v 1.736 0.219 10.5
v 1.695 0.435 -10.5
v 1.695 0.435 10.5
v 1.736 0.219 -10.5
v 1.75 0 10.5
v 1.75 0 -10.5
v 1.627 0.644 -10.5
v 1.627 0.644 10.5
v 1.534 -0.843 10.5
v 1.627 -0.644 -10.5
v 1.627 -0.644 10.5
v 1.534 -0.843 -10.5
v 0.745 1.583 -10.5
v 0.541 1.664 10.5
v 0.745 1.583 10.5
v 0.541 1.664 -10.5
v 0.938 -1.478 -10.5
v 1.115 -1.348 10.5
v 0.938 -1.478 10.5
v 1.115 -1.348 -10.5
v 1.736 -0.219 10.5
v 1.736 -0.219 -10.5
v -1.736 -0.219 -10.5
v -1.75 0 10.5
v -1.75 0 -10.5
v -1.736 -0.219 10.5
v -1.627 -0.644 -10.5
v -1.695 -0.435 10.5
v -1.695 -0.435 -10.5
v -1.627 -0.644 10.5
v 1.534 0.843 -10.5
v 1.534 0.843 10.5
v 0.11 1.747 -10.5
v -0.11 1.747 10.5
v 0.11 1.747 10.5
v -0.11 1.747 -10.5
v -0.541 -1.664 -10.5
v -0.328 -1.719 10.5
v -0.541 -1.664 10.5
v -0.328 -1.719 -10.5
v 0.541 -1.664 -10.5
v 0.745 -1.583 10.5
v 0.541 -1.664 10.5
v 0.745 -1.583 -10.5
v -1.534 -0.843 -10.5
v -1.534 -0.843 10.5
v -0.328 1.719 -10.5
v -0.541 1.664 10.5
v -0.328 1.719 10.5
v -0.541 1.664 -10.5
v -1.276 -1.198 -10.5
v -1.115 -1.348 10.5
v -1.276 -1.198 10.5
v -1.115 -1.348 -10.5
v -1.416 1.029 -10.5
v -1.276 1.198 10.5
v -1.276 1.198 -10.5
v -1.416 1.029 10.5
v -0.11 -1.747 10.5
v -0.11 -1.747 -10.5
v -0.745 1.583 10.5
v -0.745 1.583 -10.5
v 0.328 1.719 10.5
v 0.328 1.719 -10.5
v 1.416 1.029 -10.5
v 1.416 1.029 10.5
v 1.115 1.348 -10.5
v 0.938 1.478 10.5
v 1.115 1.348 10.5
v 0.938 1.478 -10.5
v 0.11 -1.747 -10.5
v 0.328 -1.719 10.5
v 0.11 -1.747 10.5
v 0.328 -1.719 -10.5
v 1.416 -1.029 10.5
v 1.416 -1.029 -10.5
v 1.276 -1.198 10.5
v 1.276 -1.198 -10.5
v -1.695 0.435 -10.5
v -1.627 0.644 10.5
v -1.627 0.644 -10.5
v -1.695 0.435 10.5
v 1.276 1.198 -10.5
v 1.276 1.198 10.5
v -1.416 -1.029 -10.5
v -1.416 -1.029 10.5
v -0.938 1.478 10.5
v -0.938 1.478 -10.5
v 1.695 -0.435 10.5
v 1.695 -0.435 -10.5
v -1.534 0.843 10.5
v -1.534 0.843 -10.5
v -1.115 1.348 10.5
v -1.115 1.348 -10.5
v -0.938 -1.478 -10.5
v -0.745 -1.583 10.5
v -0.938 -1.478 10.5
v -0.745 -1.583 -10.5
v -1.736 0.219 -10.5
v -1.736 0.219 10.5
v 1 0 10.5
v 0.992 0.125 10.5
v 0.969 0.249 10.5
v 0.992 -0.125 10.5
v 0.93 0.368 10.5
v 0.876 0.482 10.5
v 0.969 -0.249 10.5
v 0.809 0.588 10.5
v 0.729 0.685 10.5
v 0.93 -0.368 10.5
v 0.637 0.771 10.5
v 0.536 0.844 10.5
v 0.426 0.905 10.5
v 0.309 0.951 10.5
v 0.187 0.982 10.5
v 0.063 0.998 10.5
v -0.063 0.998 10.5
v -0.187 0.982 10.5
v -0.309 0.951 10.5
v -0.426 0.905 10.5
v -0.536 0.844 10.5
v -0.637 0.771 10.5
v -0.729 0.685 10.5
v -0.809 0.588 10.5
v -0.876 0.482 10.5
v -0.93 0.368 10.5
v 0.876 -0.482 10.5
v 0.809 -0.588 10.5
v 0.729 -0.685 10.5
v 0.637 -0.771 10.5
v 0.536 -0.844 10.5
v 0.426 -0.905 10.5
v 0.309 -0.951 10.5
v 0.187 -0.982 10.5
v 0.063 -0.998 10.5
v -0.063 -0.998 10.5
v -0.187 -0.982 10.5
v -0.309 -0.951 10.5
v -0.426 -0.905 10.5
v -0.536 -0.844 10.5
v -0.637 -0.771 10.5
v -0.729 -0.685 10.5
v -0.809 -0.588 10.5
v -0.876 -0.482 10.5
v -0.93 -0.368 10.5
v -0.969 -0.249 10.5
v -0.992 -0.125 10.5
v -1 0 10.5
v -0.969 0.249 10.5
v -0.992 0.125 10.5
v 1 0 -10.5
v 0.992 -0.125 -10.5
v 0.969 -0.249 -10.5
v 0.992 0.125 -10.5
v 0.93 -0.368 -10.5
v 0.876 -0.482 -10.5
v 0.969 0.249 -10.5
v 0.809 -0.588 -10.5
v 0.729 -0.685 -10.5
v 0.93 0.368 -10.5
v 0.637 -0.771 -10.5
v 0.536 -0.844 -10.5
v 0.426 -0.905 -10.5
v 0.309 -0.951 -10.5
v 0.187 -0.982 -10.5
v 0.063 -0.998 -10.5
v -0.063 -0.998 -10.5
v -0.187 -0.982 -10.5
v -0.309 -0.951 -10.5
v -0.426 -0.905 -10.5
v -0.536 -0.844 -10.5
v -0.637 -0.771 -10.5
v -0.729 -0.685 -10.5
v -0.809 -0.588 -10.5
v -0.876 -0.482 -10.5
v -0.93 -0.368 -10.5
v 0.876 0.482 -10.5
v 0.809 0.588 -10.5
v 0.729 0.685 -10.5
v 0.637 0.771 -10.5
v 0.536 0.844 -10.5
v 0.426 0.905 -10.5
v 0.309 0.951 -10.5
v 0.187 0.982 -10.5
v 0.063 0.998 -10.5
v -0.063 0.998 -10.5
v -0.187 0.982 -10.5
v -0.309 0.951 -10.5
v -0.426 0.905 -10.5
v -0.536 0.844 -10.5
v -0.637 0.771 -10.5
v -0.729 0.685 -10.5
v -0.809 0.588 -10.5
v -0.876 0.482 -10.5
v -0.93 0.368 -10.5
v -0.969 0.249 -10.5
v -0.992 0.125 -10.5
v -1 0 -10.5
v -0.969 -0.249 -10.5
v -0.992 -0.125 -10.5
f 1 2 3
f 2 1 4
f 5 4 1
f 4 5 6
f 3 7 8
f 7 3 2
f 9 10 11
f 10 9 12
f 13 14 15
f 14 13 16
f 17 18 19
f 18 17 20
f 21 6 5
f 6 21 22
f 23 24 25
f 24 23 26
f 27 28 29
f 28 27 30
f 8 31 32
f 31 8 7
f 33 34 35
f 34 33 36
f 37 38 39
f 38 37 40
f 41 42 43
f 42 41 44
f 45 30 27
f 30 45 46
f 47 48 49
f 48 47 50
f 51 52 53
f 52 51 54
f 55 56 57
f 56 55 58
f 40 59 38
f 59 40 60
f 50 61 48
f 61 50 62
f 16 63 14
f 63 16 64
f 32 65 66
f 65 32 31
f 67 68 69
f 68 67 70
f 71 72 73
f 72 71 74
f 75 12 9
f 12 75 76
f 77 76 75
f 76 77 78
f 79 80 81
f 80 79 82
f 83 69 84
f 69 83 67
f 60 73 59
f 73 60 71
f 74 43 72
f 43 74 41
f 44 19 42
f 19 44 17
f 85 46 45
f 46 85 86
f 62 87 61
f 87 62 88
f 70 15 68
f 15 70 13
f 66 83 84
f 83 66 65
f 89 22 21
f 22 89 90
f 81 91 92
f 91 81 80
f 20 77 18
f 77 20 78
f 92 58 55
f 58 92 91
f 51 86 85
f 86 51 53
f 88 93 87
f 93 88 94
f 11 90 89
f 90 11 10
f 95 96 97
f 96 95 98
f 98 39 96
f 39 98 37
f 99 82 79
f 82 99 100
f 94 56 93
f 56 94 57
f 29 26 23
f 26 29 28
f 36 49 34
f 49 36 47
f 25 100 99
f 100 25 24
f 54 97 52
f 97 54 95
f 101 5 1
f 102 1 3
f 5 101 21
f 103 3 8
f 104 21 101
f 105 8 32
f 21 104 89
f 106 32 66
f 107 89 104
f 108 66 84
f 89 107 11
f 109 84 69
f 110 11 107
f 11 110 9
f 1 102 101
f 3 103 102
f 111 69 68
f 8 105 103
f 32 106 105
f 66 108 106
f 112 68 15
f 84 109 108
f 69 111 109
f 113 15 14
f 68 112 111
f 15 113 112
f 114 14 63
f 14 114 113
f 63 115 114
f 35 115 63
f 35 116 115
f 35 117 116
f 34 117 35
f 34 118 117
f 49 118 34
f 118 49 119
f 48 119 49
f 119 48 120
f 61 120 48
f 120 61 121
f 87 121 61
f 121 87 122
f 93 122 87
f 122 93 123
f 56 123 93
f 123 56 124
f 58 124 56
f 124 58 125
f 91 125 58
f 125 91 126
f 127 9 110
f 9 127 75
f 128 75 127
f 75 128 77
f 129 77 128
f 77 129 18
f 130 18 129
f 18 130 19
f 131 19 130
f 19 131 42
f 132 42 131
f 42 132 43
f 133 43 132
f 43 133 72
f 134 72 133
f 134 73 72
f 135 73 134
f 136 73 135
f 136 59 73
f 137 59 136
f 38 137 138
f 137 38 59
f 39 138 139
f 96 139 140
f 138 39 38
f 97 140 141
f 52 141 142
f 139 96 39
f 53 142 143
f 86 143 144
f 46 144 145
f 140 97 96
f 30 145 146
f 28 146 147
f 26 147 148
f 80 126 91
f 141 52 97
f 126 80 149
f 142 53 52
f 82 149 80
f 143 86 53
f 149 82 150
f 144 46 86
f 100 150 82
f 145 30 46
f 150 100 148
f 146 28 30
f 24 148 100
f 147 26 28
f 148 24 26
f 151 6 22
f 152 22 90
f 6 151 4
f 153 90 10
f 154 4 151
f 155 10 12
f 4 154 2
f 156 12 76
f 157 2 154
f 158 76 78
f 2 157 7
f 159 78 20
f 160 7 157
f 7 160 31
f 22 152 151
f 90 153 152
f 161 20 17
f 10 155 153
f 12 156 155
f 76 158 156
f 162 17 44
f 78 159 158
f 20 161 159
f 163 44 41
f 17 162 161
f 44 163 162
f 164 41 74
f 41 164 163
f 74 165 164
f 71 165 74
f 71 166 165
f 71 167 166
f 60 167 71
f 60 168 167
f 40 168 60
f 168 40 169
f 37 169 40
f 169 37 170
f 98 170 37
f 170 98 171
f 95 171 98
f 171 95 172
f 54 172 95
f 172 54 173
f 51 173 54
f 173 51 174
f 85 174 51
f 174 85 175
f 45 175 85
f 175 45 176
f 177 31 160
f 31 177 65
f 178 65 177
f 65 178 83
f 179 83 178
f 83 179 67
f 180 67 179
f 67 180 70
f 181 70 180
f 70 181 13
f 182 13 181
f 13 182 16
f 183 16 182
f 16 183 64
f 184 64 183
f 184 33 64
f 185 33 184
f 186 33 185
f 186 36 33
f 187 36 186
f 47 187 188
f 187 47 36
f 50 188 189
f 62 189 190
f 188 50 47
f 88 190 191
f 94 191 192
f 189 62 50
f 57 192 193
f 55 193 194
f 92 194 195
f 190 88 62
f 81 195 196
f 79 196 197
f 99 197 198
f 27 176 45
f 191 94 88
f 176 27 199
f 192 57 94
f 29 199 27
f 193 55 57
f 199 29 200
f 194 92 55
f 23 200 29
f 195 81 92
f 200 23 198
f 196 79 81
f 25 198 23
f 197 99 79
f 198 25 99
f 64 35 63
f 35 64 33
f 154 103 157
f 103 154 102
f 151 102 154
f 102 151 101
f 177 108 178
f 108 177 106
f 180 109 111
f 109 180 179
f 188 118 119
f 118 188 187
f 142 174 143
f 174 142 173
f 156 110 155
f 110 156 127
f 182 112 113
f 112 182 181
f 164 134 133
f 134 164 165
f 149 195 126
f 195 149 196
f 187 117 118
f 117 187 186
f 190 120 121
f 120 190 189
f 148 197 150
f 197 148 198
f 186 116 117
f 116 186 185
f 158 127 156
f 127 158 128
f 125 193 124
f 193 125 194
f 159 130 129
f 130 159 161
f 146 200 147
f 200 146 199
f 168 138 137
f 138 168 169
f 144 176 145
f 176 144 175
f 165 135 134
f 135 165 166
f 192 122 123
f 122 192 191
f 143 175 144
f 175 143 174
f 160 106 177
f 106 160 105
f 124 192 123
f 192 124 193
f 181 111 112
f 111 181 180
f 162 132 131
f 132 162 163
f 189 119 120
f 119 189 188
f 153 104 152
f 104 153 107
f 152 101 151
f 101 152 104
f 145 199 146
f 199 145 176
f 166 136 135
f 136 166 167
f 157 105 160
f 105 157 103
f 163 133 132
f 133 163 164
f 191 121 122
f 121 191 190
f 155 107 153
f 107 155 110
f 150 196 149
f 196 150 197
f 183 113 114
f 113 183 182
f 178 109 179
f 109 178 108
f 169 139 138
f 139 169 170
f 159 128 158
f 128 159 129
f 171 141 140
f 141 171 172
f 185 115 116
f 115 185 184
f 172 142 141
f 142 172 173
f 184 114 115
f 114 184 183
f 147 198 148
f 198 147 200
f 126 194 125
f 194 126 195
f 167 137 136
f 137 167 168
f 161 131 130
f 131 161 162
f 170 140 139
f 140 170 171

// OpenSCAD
$fn = 50;


difference() {
	union() {
		translate(v = [0, 0, -10.5000000000]) {
			cylinder(h = 21, r = 1.7500000000);
		}
	}
	union() {
		translate(v = [0, 0, -100.0000000000]) {
			cylinder(h = 200, r = 1.0000000000);
		}
	}
}
